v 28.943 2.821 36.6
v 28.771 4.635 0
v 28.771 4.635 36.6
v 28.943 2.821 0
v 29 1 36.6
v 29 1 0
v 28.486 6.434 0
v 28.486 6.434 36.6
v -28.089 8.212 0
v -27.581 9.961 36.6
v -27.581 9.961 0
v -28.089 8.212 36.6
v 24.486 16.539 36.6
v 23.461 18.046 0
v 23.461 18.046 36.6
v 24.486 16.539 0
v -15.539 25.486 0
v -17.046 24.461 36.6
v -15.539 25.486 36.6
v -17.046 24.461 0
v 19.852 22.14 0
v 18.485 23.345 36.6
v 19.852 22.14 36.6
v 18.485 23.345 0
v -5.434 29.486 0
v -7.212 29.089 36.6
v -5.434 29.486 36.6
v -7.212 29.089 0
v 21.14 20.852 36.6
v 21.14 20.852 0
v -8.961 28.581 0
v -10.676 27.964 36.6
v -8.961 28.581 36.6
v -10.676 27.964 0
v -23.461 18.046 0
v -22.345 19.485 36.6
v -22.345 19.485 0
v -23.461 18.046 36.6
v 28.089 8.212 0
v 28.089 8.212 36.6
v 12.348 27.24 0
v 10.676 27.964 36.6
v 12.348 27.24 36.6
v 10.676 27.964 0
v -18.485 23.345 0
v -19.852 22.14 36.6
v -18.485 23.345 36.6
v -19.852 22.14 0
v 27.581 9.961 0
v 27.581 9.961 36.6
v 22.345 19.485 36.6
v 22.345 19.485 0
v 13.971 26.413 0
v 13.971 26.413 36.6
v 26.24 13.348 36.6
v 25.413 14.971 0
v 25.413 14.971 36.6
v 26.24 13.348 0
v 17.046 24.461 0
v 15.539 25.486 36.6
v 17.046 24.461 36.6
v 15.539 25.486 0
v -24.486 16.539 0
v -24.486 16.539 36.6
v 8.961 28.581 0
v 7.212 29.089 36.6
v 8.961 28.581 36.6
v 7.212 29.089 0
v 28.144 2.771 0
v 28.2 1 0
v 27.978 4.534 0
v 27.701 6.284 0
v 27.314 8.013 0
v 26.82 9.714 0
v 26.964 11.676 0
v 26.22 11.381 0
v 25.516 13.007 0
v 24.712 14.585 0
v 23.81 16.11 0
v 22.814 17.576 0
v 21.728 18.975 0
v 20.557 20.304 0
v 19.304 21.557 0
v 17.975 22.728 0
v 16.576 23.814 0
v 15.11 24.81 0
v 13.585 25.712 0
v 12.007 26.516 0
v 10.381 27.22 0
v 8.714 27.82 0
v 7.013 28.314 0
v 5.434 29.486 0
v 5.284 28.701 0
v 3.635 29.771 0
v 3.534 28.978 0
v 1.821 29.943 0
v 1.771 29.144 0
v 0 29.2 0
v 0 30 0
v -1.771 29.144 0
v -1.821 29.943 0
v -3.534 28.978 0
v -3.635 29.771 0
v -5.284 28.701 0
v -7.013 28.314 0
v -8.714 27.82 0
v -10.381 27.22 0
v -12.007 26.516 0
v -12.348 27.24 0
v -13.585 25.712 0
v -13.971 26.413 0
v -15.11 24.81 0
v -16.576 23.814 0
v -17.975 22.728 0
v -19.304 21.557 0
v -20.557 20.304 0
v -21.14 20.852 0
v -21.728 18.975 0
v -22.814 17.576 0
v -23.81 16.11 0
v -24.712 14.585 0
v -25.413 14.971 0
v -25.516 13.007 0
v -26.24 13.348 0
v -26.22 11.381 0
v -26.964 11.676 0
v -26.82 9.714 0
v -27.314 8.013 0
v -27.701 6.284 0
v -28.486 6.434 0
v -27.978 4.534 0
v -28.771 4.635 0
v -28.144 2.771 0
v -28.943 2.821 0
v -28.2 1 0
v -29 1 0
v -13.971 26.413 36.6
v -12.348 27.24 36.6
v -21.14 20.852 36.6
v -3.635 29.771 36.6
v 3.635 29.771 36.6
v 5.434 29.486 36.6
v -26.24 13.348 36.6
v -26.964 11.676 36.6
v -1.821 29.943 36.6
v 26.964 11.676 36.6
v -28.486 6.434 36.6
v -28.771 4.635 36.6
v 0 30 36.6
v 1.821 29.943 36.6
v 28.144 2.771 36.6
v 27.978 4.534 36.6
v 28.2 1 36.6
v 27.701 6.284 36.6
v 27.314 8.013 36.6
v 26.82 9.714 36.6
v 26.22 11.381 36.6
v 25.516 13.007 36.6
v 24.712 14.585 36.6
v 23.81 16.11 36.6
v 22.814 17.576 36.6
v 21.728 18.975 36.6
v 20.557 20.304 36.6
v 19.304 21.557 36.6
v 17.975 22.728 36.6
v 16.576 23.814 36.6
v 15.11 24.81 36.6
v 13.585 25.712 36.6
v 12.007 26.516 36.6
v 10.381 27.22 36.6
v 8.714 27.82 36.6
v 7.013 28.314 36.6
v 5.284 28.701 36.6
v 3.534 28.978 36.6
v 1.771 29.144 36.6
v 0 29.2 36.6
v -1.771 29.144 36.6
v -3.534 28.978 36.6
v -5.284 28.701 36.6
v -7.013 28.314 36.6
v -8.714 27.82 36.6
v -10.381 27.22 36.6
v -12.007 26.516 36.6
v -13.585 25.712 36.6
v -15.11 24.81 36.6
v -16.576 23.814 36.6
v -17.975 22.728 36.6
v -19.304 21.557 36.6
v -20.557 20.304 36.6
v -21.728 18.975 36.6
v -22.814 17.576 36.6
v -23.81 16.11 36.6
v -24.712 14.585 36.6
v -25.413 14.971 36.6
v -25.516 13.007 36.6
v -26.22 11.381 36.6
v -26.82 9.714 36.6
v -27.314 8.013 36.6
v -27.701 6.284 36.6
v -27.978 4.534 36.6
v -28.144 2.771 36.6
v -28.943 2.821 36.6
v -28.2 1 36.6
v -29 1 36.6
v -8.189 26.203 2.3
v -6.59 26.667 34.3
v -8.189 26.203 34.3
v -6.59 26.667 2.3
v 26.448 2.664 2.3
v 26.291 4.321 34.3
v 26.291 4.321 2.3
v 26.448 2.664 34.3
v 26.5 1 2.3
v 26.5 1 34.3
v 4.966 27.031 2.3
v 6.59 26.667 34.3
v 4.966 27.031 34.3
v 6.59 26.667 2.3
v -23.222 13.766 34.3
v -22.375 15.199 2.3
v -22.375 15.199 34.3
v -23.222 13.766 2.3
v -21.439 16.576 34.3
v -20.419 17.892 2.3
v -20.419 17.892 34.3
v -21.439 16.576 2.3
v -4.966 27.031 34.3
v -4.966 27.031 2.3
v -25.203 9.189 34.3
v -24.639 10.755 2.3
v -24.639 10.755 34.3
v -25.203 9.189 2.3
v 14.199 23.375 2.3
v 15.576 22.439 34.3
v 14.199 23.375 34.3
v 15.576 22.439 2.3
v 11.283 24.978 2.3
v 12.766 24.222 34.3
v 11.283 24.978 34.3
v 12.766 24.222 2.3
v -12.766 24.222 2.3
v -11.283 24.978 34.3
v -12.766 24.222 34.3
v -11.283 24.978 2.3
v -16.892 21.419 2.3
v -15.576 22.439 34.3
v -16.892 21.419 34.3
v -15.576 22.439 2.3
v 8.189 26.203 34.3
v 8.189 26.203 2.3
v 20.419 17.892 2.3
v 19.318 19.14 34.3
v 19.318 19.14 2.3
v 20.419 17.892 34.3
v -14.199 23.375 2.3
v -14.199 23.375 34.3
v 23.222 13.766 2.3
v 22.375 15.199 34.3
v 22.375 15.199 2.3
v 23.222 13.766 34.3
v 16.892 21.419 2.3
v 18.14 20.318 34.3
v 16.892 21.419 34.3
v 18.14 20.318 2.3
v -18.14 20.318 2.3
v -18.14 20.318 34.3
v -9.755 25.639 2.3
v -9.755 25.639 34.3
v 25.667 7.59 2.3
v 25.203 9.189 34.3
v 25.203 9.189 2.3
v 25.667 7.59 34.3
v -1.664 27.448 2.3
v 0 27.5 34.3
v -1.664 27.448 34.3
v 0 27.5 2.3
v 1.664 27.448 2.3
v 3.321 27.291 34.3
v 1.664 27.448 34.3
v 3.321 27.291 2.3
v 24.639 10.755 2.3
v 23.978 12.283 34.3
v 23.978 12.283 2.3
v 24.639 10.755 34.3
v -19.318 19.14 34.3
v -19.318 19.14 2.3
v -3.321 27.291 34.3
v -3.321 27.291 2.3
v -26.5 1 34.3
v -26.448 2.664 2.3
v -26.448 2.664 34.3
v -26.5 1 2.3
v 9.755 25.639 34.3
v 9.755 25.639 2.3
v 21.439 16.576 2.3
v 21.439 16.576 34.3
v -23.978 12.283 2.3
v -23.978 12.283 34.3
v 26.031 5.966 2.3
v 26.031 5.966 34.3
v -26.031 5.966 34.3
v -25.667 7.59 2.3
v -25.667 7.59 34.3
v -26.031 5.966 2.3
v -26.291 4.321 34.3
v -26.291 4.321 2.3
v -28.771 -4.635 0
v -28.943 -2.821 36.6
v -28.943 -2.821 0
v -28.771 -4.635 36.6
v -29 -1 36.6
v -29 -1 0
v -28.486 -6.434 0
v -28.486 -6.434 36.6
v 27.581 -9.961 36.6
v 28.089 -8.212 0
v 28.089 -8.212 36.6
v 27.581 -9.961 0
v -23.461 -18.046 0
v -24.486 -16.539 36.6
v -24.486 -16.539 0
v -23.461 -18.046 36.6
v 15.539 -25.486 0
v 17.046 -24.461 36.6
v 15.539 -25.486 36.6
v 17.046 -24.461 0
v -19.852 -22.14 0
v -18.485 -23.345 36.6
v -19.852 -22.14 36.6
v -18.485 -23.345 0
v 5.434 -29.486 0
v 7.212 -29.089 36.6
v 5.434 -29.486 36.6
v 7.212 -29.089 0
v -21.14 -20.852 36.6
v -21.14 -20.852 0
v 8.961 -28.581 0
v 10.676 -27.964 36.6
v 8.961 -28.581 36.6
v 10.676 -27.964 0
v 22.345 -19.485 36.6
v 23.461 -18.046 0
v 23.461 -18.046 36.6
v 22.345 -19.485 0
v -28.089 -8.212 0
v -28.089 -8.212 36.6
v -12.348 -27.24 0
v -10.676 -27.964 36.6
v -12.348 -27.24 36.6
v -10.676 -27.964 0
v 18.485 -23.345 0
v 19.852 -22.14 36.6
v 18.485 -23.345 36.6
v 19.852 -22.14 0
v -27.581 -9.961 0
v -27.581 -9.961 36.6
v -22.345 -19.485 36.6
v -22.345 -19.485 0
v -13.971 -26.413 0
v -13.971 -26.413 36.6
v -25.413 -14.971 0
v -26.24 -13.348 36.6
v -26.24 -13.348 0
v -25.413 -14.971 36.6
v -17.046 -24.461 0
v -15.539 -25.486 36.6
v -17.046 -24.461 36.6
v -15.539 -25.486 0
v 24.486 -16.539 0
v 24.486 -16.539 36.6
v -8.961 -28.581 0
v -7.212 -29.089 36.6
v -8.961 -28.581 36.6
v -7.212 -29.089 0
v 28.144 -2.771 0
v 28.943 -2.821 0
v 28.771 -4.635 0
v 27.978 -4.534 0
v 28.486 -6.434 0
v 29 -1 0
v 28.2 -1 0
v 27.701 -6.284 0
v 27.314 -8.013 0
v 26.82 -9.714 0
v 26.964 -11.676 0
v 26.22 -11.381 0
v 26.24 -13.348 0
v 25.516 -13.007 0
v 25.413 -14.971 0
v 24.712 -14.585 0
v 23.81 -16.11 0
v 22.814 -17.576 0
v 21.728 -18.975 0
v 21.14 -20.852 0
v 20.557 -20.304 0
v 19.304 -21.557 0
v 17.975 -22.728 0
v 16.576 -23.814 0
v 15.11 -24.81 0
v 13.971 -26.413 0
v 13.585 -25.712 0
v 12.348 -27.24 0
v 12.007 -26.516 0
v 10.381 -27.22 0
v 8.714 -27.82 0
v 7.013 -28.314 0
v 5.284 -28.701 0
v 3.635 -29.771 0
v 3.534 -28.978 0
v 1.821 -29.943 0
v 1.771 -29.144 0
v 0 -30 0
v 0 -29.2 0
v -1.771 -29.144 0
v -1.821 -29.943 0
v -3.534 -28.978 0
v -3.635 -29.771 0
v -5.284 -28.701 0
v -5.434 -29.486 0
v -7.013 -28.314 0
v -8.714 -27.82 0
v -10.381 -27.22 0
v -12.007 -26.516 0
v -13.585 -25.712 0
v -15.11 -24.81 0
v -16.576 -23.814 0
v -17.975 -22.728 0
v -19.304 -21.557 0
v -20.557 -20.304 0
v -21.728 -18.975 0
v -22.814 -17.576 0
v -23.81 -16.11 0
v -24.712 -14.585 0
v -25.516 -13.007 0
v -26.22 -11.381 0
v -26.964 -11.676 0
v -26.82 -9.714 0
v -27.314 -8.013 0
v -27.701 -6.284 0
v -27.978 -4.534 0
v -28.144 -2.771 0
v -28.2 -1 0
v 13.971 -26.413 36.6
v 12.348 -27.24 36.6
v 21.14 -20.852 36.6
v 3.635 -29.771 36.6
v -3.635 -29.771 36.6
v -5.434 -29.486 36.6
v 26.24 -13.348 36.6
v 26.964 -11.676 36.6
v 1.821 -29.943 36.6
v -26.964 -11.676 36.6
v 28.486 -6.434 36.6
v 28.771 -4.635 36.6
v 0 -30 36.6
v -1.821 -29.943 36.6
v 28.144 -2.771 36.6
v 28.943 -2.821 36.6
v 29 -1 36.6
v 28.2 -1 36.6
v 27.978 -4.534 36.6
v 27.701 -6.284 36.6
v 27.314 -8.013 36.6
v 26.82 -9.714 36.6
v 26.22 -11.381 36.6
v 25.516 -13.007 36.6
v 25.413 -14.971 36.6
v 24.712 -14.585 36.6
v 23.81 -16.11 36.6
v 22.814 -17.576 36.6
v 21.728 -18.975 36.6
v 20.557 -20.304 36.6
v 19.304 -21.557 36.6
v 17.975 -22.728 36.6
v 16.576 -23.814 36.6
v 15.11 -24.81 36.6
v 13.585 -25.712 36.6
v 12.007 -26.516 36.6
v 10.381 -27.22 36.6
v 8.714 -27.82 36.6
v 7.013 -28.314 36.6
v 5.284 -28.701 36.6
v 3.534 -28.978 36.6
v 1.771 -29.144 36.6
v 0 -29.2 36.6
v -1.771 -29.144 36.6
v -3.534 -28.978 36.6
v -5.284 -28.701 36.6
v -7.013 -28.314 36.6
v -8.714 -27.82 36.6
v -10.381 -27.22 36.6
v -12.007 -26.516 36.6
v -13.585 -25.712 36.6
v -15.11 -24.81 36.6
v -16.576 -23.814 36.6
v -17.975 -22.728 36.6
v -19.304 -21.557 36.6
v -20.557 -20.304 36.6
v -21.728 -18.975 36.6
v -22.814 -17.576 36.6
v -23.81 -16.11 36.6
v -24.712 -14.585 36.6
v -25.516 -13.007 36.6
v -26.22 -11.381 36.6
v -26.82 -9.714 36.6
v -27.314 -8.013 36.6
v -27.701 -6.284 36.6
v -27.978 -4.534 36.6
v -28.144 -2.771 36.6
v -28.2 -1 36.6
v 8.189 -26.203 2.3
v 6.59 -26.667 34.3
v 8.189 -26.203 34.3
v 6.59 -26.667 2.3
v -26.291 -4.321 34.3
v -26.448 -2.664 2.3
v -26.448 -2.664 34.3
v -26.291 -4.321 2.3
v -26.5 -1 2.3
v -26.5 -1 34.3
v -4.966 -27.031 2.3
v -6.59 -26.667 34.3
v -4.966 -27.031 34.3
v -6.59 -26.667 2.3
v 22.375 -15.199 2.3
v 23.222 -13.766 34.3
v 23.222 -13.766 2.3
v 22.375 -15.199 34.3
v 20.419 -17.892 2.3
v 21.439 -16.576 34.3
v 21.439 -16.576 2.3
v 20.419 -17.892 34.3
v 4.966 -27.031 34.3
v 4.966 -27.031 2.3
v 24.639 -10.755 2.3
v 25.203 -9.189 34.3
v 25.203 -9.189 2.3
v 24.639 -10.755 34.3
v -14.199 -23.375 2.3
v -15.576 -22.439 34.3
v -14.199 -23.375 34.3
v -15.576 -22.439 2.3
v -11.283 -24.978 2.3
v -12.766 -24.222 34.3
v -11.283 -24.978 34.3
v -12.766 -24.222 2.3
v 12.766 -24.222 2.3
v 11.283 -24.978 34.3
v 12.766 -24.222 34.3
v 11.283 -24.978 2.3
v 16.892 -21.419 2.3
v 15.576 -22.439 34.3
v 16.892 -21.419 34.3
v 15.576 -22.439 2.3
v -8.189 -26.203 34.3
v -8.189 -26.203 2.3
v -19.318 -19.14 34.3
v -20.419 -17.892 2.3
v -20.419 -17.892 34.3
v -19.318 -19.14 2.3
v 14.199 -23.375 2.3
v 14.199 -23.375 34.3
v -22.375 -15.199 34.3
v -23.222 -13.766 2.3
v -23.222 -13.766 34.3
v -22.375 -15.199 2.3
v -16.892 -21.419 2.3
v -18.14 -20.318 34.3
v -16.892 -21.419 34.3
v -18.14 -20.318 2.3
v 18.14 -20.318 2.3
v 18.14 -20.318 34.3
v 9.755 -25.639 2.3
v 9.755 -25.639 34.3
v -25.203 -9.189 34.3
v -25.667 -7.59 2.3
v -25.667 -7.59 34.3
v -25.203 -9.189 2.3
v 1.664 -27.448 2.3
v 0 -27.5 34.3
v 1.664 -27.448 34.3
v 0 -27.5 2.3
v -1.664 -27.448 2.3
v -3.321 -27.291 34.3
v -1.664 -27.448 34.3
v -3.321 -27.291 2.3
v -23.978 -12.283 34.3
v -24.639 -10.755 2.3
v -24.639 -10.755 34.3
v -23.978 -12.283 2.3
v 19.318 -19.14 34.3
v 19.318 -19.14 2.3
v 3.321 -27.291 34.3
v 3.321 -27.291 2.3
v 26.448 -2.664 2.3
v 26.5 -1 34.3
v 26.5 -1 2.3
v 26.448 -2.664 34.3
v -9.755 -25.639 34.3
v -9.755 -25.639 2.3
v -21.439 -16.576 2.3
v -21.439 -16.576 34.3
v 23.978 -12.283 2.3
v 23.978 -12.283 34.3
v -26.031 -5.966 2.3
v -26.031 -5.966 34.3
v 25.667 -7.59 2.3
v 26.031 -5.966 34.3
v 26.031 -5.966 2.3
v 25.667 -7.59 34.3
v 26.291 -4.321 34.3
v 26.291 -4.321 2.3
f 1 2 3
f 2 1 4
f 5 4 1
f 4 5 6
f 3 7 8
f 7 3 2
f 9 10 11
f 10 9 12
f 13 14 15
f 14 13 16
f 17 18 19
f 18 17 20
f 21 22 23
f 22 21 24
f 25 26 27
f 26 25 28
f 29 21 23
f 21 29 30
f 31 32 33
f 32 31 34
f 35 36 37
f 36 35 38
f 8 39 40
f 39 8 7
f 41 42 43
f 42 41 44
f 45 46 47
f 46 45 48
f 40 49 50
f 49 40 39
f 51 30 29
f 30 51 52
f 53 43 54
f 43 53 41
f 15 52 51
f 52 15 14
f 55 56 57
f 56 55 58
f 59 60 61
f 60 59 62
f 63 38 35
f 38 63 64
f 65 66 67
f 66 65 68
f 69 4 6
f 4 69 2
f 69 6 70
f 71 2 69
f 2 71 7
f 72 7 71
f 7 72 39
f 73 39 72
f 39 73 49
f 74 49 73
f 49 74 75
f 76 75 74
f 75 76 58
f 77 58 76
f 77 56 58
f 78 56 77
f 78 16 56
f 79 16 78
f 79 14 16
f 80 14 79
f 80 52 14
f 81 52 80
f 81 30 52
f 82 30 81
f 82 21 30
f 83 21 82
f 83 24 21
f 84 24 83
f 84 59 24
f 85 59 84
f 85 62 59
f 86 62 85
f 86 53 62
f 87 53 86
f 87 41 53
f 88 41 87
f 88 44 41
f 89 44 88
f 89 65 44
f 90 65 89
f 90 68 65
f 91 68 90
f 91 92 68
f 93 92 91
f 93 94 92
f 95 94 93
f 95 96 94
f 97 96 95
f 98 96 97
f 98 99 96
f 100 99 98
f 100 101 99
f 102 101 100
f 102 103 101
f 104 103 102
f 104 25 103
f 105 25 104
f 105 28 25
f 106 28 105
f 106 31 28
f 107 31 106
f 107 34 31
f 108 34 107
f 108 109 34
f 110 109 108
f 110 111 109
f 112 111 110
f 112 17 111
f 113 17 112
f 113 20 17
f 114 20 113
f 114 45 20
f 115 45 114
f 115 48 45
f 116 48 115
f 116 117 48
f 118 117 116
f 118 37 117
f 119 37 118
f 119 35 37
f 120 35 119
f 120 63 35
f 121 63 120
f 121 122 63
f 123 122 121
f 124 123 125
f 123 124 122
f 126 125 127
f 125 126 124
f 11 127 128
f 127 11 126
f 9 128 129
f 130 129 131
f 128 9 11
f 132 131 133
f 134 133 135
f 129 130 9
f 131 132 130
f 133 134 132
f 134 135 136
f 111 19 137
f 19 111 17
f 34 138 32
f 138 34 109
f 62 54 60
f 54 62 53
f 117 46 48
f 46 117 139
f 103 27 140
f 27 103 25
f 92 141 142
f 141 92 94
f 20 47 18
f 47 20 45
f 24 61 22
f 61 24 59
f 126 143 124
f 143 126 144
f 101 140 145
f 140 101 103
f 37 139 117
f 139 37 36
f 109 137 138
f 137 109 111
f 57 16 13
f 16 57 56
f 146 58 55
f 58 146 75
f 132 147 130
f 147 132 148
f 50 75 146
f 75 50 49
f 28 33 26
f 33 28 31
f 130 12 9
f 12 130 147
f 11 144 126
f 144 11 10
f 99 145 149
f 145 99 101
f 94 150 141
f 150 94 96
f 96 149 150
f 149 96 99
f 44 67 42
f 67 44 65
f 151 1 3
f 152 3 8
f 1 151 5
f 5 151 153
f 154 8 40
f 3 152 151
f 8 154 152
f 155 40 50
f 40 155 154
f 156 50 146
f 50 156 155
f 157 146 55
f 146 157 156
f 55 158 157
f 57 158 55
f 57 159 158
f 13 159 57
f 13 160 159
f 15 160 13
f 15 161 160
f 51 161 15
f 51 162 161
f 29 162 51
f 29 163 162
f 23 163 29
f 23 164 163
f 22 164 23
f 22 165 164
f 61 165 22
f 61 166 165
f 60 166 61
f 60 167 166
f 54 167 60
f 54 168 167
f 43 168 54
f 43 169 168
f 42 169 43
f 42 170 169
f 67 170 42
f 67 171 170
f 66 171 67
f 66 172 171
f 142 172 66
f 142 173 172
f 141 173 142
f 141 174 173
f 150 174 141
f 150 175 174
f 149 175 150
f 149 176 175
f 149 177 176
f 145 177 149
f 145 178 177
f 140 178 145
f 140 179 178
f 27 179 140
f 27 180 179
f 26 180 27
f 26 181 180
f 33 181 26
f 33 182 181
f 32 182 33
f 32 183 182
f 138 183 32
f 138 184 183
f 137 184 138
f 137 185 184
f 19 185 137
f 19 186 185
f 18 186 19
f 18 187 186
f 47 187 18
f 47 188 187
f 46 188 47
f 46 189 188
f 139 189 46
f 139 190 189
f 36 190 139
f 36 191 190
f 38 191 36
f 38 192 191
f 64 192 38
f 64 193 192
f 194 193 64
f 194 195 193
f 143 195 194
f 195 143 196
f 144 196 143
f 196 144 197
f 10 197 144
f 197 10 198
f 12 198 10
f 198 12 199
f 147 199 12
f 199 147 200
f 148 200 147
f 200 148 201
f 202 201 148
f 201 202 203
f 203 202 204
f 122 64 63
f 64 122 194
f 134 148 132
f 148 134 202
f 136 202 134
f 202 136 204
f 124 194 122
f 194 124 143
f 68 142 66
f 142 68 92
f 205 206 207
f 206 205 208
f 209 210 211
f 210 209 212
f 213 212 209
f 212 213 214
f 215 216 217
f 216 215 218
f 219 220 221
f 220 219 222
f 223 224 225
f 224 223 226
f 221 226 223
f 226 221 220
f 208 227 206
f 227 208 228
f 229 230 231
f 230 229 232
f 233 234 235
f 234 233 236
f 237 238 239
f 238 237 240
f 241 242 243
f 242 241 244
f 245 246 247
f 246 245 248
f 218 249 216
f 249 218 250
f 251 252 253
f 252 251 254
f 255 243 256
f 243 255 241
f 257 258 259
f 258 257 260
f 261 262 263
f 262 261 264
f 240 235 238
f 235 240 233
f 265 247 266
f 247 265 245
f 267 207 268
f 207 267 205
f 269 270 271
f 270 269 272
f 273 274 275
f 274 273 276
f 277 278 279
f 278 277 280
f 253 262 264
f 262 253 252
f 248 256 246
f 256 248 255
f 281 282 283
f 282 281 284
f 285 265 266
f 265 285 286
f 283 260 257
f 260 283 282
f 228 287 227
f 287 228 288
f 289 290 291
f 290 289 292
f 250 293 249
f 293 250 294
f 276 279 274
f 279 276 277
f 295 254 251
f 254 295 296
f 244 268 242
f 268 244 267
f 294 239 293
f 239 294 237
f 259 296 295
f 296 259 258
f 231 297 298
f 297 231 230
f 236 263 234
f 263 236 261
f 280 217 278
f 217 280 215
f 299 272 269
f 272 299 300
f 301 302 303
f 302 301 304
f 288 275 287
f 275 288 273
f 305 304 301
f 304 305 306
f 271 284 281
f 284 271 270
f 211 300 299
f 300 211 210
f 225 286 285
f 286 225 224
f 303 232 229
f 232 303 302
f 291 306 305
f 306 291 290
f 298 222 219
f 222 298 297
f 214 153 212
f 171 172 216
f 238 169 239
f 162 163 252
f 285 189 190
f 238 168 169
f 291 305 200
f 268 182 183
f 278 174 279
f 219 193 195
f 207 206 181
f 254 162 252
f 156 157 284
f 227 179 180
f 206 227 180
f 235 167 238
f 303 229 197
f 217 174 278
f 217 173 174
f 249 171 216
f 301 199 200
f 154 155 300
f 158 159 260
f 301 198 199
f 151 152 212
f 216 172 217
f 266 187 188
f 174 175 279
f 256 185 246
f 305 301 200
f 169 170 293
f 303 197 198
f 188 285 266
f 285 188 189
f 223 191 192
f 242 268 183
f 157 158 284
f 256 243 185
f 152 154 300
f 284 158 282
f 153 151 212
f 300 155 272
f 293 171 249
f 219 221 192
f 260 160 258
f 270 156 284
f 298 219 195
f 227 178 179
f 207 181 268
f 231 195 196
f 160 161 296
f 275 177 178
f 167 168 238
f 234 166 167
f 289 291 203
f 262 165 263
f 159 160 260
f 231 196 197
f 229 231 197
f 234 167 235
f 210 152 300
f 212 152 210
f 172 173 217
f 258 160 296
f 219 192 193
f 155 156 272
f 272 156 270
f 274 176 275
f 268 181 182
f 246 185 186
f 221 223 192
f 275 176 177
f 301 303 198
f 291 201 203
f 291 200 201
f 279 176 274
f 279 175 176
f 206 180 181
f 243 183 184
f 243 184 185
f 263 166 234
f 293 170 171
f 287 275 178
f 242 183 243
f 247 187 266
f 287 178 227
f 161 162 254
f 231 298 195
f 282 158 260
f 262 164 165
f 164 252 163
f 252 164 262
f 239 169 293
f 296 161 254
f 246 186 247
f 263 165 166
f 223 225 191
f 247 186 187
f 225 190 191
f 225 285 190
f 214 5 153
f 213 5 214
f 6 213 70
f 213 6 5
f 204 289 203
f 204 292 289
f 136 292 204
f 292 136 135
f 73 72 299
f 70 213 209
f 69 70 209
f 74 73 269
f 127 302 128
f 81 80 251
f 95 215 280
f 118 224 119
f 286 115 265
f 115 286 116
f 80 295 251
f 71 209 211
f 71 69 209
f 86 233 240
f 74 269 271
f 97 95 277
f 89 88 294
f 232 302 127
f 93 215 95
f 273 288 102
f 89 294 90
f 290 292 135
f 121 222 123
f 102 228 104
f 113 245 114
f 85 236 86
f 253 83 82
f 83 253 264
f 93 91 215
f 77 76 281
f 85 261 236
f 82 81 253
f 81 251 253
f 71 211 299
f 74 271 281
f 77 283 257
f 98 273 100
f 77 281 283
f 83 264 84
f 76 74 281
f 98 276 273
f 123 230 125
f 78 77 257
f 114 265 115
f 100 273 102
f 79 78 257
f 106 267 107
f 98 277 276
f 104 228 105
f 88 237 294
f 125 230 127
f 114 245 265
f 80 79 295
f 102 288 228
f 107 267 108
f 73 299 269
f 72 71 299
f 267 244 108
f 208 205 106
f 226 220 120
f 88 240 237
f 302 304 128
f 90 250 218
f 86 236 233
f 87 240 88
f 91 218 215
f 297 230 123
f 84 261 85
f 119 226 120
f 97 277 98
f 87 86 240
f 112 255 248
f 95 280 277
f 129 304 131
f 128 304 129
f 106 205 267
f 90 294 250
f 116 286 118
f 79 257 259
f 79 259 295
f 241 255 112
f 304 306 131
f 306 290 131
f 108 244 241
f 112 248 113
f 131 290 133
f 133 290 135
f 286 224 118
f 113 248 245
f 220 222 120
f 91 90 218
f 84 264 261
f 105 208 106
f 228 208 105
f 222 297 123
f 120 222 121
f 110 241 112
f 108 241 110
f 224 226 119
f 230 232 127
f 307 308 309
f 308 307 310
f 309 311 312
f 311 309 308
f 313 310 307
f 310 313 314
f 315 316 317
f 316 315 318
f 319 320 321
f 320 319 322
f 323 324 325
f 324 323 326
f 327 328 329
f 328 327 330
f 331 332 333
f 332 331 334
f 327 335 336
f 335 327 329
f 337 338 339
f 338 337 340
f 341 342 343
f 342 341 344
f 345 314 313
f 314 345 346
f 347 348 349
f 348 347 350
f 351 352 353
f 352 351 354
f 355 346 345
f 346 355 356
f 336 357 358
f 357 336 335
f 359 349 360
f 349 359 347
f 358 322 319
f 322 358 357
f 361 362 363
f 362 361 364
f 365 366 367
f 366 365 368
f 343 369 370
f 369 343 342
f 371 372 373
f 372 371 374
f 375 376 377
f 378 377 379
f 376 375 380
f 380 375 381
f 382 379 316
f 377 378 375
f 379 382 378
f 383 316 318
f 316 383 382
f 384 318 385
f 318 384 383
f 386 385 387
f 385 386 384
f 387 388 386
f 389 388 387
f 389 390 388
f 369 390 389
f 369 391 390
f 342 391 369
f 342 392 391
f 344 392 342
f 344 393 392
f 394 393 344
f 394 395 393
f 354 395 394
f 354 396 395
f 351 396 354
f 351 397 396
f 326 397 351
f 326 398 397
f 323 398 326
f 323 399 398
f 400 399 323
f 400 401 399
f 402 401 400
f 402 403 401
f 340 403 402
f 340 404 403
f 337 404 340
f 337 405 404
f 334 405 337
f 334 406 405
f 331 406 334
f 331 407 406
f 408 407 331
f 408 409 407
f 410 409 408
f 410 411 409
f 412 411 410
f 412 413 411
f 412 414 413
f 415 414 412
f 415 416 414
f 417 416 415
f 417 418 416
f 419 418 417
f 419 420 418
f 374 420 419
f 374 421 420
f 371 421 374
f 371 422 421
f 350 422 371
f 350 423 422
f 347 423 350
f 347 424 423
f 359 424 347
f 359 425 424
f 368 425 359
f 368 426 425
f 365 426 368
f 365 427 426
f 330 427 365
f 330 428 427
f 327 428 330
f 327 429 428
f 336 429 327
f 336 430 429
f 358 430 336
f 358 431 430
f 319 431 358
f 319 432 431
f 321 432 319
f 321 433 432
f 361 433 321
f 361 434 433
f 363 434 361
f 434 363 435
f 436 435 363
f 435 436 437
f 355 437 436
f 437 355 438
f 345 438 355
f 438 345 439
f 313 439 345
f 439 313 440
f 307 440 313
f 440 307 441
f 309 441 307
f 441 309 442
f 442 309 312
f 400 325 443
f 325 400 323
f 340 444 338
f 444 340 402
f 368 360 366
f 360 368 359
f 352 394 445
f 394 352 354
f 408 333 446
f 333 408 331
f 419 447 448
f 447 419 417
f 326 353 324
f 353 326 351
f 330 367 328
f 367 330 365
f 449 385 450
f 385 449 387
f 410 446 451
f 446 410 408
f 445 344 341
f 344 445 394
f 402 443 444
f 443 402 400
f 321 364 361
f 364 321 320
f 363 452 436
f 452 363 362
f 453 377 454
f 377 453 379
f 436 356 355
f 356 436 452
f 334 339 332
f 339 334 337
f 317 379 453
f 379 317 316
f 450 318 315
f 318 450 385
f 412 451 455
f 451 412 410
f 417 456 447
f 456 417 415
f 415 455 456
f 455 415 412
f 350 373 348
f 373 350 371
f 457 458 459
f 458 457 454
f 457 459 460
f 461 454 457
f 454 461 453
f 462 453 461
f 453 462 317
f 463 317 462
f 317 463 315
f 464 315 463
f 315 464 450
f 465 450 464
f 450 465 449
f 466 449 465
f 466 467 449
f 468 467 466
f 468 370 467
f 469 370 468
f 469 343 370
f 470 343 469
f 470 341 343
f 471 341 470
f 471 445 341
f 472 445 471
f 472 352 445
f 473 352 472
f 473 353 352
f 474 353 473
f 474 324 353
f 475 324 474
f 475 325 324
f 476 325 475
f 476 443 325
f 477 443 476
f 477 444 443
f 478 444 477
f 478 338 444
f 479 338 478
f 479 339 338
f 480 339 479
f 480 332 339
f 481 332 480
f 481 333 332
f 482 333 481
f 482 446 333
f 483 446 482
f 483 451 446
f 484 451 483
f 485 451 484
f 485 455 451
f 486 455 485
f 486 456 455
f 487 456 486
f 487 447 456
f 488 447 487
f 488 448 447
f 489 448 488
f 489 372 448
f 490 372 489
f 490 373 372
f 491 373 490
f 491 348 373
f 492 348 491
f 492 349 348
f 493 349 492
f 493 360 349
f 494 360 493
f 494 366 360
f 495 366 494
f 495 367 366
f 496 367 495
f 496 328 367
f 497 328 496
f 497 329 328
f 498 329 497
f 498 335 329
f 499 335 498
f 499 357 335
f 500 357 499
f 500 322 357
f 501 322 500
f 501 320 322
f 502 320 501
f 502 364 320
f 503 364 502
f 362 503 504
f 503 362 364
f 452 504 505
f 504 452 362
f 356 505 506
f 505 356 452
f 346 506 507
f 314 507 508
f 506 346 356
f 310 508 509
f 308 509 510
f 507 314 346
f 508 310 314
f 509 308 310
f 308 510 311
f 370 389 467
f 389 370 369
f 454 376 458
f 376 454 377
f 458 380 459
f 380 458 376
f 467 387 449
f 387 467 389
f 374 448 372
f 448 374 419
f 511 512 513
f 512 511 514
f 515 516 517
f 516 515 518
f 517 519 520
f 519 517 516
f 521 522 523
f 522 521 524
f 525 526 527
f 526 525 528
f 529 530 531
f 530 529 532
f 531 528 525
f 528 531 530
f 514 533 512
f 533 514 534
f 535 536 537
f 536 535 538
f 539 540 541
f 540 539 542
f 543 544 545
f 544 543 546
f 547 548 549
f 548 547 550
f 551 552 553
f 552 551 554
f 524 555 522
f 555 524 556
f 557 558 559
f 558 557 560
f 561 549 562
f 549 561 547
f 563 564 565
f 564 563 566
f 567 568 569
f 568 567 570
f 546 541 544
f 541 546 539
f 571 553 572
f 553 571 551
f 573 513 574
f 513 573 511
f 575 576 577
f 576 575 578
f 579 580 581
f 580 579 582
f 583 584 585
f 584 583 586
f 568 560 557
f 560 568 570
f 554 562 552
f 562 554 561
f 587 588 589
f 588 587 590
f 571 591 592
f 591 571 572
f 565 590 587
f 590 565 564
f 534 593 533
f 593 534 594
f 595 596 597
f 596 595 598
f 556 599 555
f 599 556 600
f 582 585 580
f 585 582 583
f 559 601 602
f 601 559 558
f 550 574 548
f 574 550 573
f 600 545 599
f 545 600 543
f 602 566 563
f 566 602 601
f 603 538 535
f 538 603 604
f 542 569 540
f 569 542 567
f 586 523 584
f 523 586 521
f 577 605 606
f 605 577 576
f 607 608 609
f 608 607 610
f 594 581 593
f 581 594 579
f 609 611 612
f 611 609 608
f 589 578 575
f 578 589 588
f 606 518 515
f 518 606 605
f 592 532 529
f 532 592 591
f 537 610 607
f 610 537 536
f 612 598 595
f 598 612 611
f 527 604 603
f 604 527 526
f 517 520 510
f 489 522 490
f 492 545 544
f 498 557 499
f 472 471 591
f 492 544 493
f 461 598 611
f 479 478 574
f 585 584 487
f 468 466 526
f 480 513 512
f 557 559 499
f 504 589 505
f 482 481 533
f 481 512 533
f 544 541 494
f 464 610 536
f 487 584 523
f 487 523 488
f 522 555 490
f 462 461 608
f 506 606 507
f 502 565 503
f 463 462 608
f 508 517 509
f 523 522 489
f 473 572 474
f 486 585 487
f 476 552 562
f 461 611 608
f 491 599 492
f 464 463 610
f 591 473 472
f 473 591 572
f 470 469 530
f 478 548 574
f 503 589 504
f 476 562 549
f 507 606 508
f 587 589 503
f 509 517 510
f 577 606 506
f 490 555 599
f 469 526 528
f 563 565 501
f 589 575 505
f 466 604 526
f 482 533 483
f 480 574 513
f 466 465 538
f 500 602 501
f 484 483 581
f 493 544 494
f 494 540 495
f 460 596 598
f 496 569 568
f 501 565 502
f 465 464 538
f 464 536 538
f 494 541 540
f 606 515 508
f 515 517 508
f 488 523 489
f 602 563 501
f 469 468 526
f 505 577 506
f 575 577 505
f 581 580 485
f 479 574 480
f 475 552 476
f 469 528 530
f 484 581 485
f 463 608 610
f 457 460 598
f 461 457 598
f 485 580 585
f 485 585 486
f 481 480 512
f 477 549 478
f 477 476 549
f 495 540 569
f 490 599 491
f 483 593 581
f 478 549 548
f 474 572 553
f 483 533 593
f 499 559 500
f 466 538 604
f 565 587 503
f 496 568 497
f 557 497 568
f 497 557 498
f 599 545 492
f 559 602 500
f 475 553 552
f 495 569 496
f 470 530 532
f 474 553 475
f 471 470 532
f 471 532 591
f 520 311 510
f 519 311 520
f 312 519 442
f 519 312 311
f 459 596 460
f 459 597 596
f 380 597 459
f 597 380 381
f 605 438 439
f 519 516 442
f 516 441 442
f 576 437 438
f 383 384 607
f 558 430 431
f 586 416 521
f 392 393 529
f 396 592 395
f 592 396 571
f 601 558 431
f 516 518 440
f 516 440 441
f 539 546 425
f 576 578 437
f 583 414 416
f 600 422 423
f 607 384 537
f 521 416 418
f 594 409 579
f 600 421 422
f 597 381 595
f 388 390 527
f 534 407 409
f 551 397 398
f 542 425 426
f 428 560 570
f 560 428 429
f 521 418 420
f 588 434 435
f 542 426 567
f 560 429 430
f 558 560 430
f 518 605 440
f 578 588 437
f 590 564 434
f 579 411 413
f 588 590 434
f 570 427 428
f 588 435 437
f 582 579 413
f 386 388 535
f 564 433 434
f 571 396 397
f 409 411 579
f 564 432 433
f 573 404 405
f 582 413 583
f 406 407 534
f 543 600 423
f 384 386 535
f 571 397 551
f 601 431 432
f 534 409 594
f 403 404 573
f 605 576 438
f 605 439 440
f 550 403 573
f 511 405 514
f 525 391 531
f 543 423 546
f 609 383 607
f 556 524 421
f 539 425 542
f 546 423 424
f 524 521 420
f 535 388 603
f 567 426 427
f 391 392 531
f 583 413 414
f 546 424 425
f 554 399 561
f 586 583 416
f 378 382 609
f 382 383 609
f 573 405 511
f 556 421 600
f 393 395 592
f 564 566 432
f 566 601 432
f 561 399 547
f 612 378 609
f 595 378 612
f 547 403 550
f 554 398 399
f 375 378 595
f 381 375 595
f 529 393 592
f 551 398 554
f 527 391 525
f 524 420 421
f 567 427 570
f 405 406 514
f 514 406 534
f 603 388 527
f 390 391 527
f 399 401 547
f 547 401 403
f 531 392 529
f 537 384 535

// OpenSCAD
// file: spool_backing.scad
th_in=1.5;
th_out=1.5;

s_w=1;
s_n=15;

p_w=0.8;

$fn=100;

module support_diff(d1=30,d2=28,d3=38,d4=40,h1=20,h2=25){
    ds_in_max=d1+(th_in*2);
    ds_in_min=d2+(th_in*2);
    hs_in=h2+th_out;
    ds_out_max=d4-(th_out*2);
    ds_out_min=d3-(th_out*2);
    hs_out=h2;
    union(){
    difference(){
        cylinder(r1=ds_out_max/2, r2=ds_out_min/2, h=hs_out);
        translate([0,0,(hs_out-hs_in)/2])cylinder(r1=ds_in_max/2, r2=ds_in_min/2, h=hs_in);
        for(ang=[0:360/(s_n*2):360]){
            rotate([0,0,ang])translate([(d2/2)-1,-s_w/2,-1])cube([20,s_w,h2+2]);
        }
        translate([-d4,-s_w,0])cube([d4*2,s_w*2,hs_out]);
}
}
}

module stand(d1=30,d2=28,d3=38,d4=40,h1=20,h2=25, ss_w=1){
    difference(){
        translate([0,0,0])cylinder(r1=d4/2-p_w, r2=d1/2, h=(h2-h1)/2);
        for(ang=[0:360/(s_n*2):360]){
            rotate([0,0,ang])translate([(d2/2)-1,-ss_w/2,-1])cube([3,ss_w,h2+2]);
        }
        translate([(d2/2)-1,-ss_w,-1])cube([3,ss_w,h2+2]);
        translate([(d2/2)-1,0,-1])cube([3,ss_w,h2+2]);
        translate([-(d2/2+3)+1,-ss_w,-1])cube([3,ss_w,h2+2]);
        translate([-(d2/2+3)+1,0,-1])cube([3,ss_w,h2+2]);
    }
    }


module spool_backing(d1=30,d2=28,d3=38,d4=40,h1=20,h2=25, support=true, stand=false){
    h_delta=(h2-h1)/2;
    difference(){
        cylinder(r1=d4/2, r2=d3/2, h=h2);
        translate([0,0,h_delta])cylinder(r1=d1/2, r2=d2/2, h=h1);
        translate([0,0,h1+h_delta])cylinder(r1=d2/2, r2=d3/2-p_w, h=(h2-h1)/2);
        
        if(support){
            support_diff(d1=d1,d2=d2,d3=d3,d4=d4,h1=h1,h2=h2);
        }
        translate([-d4,-d4,-1])cube([d4*2,d4,h2*2]);
    if(stand){
        //for(st_a=[5:34:175]){
        //    rotate([0,0,st_a])translate([d1/2,-p_w/2,0])cube([(d4-d1)/2-p_w,p_w,1]);
        //}
        stand(d1=d1,d2=d2,d3=d3,d4=d4,h1=h1,h2=h2);
    }else{
        translate([0,0,0])cylinder(r1=d4/2-p_w, r2=d1/2, h=(h2-h1)/2);
        //support();
    }
}
}

//spool_backing(stand=true);
stand();
// main file
model="Shimano Ultegra XTC 14000 to 10000";
d1 = 53;
d2 = 53;
h1 = 32;

d4 = 58;
d3 = 58;
h2 = 36.6;

use <spool_backing.scad>

translate([0,1,0])spool_backing(d1=d1,d2=d2,d3=d3,d4=d4,h1=h1,h2=h2);
translate([0,-1,0])rotate([0,0,180])spool_backing(d1=d1,d2=d2,d3=d3,d4=d4,h1=h1,h2=h2);
